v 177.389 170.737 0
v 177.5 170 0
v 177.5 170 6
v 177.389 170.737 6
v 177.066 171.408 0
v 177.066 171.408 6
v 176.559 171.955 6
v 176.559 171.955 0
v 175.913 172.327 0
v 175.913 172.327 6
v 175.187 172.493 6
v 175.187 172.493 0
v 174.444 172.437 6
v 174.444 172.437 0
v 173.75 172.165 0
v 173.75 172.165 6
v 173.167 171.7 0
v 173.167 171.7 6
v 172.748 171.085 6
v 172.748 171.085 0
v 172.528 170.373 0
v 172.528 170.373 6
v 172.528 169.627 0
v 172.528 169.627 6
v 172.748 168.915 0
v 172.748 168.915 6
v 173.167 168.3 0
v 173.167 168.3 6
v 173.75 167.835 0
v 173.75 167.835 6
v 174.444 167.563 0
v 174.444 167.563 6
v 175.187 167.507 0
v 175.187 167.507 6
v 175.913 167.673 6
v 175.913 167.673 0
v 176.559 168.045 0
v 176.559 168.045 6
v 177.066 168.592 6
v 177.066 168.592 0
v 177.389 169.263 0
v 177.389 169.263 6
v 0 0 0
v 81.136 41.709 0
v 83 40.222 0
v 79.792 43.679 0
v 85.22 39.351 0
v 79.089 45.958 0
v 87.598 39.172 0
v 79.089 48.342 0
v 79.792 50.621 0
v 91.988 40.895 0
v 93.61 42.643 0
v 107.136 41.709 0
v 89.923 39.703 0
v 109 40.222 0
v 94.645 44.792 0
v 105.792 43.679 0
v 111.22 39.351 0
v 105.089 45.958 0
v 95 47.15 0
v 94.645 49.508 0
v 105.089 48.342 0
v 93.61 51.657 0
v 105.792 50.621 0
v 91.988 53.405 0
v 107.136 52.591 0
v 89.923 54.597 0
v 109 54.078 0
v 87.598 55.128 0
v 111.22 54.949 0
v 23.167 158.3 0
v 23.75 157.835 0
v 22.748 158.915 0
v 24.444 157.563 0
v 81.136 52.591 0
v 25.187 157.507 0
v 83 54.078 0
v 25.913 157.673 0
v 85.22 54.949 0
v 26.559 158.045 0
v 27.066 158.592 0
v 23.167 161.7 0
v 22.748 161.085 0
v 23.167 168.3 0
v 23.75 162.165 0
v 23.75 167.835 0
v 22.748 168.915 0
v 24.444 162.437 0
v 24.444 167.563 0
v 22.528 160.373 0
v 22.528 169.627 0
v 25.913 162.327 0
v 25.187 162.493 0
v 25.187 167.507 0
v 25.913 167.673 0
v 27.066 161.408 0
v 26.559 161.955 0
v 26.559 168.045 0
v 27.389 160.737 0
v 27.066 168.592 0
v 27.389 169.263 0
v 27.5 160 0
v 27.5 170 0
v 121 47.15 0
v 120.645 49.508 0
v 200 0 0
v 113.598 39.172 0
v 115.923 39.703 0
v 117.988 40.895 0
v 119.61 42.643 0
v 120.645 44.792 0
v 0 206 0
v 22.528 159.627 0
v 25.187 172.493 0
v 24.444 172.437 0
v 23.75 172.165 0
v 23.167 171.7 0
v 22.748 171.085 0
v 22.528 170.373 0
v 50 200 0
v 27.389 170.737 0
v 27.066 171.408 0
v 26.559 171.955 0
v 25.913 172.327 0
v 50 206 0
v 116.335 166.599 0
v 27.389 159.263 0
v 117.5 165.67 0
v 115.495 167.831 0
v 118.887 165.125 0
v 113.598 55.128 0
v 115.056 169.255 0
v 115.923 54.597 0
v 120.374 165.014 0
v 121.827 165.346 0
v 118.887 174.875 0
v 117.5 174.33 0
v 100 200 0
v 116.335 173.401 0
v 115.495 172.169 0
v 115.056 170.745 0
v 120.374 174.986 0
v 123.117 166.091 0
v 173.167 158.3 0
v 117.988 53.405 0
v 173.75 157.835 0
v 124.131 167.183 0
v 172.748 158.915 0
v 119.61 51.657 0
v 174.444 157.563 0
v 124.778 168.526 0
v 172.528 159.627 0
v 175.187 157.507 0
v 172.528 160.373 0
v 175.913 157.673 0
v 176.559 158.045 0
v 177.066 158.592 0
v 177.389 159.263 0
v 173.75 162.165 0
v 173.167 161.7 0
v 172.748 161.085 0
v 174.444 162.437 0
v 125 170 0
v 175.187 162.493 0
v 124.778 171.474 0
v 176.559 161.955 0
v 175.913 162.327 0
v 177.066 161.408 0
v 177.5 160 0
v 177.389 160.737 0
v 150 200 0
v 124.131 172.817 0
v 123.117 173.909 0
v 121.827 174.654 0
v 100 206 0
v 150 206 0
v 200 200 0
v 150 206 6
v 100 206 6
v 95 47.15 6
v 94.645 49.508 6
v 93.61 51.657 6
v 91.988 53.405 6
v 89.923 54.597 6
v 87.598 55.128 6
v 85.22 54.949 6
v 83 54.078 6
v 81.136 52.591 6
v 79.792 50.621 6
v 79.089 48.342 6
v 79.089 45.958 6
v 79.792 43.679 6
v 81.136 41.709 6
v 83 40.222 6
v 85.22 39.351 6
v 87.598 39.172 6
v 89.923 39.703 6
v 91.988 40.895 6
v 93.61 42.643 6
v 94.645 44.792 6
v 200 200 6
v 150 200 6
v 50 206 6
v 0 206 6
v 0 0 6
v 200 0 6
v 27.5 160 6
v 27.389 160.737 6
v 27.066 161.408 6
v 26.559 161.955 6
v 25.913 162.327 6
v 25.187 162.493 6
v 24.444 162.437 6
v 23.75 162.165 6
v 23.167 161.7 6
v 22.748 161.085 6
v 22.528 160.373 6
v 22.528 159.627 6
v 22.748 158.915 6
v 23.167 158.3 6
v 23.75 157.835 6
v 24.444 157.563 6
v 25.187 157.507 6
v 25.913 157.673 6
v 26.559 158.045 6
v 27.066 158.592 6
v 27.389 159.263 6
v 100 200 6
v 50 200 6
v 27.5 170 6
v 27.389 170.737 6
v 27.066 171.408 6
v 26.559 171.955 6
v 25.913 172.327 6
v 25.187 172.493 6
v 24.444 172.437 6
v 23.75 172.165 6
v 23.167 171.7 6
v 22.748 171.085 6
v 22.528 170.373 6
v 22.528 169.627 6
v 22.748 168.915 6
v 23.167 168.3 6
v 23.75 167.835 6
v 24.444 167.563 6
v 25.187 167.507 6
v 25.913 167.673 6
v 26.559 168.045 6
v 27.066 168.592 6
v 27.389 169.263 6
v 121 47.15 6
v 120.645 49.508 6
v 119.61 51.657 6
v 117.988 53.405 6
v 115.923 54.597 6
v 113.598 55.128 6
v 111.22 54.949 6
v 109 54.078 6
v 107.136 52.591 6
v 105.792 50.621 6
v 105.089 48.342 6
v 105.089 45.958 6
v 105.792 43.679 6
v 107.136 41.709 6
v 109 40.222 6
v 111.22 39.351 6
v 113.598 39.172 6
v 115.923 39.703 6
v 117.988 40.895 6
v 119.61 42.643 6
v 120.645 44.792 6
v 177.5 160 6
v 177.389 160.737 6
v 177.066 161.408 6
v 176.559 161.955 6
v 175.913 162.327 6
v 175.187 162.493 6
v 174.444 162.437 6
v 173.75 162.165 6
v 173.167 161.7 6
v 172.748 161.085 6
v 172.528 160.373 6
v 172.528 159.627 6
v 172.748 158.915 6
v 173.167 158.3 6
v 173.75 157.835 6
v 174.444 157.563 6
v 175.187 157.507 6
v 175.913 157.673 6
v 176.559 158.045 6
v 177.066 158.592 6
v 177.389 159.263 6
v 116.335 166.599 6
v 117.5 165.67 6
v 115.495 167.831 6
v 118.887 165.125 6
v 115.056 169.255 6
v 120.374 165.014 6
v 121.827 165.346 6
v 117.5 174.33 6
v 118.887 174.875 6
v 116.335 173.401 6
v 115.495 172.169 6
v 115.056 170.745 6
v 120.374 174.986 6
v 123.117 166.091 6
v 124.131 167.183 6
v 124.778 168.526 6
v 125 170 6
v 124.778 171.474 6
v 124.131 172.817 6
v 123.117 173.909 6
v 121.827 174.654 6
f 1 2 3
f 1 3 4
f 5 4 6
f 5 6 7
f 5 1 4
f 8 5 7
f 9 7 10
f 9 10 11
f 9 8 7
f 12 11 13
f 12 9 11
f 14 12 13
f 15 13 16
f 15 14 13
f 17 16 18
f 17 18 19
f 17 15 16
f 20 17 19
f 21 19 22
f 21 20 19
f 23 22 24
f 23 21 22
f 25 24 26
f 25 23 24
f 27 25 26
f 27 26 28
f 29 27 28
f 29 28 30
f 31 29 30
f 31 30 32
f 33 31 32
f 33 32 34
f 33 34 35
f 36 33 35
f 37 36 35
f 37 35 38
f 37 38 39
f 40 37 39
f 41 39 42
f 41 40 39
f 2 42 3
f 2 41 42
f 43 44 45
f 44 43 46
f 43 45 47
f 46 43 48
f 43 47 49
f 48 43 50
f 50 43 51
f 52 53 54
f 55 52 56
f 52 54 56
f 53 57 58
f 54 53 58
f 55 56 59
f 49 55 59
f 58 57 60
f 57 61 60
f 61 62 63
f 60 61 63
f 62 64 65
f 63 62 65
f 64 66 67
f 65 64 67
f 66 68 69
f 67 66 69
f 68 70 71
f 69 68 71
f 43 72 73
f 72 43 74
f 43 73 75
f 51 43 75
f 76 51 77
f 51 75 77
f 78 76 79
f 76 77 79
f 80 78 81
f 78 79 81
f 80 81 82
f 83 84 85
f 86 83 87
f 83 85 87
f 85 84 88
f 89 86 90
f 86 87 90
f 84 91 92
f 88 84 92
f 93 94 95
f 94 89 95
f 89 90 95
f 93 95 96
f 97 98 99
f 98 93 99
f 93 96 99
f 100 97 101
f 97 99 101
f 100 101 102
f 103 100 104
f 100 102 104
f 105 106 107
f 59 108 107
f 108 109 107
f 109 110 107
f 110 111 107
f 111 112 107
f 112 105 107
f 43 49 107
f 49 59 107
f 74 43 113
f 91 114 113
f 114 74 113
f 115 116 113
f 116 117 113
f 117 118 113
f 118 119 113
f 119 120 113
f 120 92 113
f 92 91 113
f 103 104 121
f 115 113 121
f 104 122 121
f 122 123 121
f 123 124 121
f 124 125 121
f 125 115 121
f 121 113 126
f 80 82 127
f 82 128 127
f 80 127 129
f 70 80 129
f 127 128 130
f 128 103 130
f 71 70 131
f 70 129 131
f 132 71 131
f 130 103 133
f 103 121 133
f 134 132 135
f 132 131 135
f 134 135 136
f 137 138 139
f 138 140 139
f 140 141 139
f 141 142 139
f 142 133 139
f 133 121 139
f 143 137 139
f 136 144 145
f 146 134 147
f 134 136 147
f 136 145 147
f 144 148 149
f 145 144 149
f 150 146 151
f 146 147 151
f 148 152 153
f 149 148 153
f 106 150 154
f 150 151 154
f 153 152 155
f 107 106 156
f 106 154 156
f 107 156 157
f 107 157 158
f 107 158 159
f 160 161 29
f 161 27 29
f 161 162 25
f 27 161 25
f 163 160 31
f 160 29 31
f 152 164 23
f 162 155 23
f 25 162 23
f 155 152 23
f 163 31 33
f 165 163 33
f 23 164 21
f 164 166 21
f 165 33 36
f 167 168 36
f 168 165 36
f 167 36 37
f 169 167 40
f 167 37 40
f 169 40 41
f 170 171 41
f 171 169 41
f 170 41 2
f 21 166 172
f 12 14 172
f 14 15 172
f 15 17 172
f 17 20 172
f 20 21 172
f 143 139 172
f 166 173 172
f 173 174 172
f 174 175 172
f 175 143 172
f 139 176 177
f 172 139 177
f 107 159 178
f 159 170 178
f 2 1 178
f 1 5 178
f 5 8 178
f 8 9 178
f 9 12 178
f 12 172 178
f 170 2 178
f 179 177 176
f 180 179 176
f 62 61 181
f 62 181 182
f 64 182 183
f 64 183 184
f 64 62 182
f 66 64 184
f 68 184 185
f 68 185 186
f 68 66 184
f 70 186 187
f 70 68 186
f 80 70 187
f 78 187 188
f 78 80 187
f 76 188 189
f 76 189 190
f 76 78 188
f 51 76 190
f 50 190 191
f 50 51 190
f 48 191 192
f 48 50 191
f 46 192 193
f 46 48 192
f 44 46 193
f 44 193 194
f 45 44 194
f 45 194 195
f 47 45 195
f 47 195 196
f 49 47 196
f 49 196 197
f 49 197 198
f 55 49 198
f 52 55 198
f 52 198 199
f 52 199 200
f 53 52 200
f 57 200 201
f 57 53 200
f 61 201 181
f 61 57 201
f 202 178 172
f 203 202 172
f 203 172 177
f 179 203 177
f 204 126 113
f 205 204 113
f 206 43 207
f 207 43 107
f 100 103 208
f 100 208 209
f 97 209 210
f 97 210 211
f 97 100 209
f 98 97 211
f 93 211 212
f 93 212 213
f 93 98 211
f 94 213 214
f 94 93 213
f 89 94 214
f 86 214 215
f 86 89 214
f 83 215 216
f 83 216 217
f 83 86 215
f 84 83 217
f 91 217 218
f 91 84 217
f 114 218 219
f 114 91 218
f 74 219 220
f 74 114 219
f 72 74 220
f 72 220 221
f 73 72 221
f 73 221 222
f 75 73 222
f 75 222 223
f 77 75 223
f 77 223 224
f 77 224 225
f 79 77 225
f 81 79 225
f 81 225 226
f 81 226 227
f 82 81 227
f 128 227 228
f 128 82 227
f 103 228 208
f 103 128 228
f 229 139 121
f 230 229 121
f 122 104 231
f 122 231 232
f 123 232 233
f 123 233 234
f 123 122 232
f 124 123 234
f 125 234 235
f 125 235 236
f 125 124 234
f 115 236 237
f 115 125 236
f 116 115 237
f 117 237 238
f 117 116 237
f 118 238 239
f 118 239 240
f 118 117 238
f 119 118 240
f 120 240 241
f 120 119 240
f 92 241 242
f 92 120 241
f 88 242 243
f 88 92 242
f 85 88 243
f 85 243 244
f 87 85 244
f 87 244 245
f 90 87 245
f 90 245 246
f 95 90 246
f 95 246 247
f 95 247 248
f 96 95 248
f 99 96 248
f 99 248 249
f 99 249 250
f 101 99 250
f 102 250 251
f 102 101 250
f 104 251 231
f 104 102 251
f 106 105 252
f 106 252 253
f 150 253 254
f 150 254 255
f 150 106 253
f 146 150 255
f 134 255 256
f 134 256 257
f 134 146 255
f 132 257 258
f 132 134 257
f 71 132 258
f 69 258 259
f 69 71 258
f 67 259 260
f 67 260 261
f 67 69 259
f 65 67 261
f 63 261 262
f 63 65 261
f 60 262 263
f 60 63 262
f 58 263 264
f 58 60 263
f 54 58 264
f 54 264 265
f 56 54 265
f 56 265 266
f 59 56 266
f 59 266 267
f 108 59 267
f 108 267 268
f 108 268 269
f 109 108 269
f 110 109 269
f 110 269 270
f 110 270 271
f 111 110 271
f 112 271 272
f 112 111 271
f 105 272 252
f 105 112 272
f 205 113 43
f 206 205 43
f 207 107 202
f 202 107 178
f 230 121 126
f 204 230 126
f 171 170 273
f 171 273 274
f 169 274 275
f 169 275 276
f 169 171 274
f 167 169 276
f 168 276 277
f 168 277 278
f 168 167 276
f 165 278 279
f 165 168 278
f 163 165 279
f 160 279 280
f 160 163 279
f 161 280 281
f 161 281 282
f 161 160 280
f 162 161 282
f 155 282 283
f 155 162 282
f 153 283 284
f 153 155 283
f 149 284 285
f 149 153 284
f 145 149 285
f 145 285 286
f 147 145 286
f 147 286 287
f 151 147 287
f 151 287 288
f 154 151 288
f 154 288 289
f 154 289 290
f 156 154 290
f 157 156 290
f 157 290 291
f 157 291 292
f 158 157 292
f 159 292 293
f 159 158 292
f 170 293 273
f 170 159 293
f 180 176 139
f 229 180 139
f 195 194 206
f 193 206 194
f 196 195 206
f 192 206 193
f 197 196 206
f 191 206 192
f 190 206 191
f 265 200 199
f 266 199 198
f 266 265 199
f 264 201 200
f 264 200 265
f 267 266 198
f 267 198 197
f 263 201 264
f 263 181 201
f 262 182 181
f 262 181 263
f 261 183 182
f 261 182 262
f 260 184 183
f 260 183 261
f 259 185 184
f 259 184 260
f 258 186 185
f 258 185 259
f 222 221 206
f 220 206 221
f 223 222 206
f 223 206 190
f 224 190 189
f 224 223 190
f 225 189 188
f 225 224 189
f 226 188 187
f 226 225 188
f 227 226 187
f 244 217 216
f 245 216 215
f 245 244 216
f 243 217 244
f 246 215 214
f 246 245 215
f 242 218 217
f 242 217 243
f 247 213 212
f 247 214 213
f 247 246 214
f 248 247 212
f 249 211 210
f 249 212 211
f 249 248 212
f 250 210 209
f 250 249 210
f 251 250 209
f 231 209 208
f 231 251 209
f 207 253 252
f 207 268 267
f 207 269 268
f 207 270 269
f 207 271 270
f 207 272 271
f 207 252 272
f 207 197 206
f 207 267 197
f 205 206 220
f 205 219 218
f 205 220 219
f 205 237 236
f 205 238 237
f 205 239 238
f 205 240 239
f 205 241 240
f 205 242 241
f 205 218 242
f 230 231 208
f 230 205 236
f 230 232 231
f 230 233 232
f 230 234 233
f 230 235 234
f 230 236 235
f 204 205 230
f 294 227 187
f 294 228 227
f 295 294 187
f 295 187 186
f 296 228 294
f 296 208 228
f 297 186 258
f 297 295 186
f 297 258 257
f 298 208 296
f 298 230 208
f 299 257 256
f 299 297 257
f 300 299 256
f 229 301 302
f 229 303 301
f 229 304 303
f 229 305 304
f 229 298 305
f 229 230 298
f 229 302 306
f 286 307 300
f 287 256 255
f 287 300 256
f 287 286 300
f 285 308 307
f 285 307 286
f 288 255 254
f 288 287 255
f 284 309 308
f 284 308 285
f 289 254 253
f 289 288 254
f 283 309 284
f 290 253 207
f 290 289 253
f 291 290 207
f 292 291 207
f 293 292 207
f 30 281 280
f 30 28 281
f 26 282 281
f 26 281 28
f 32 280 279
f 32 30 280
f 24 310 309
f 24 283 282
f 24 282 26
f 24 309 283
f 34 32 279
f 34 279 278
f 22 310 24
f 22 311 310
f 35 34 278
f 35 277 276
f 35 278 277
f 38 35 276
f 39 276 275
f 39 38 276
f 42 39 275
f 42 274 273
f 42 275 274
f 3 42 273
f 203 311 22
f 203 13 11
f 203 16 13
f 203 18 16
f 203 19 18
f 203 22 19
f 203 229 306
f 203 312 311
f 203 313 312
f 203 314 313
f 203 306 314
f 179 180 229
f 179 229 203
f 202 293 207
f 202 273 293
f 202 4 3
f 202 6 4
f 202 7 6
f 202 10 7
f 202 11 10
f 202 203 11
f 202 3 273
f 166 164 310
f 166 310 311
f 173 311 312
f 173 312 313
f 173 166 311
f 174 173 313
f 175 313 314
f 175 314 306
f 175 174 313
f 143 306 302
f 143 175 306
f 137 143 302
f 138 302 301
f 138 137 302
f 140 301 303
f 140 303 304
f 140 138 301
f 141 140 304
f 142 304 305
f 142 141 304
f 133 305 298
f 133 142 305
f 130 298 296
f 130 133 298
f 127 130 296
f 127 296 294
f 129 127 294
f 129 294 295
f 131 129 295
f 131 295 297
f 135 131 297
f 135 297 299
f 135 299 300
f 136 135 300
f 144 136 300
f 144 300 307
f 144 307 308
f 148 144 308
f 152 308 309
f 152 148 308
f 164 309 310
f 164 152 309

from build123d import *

# Parameters (mm, degrees)
ESQUISSE1_R        = 2.5
ESQUISSE1_R_2      = 5
ESQUISSE1_R_3      = 8
BOSS_EXTRU_1_DEPTH = 6


with BuildPart() as part:
    # Esquisse1 → Boss.-Extru.1 (new body)
    with BuildSketch(Plane.XY):
        Polygon((0, 0), (200, 0), (200, 200), (150, 200), (150, 206), (100, 206), (100, 200), (50, 200), (50, 206), (0, 206), align=None)
        with Locations((175, 170)):
            Circle(ESQUISSE1_R, mode=Mode.SUBTRACT)
        with Locations((175, 160)):
            Circle(ESQUISSE1_R, mode=Mode.SUBTRACT)
        with Locations((25, 170)):
            Circle(ESQUISSE1_R, mode=Mode.SUBTRACT)
        with Locations((25, 160)):
            Circle(ESQUISSE1_R, mode=Mode.SUBTRACT)
        with Locations((120, 170)):
            Circle(ESQUISSE1_R_2, mode=Mode.SUBTRACT)
        with Locations((87, 47.14998282)):
            Circle(ESQUISSE1_R_3, mode=Mode.SUBTRACT)
        with Locations((113, 47.14998282)):
            Circle(ESQUISSE1_R_3, mode=Mode.SUBTRACT)
    extrude(amount=BOSS_EXTRU_1_DEPTH)


solid = part.part
